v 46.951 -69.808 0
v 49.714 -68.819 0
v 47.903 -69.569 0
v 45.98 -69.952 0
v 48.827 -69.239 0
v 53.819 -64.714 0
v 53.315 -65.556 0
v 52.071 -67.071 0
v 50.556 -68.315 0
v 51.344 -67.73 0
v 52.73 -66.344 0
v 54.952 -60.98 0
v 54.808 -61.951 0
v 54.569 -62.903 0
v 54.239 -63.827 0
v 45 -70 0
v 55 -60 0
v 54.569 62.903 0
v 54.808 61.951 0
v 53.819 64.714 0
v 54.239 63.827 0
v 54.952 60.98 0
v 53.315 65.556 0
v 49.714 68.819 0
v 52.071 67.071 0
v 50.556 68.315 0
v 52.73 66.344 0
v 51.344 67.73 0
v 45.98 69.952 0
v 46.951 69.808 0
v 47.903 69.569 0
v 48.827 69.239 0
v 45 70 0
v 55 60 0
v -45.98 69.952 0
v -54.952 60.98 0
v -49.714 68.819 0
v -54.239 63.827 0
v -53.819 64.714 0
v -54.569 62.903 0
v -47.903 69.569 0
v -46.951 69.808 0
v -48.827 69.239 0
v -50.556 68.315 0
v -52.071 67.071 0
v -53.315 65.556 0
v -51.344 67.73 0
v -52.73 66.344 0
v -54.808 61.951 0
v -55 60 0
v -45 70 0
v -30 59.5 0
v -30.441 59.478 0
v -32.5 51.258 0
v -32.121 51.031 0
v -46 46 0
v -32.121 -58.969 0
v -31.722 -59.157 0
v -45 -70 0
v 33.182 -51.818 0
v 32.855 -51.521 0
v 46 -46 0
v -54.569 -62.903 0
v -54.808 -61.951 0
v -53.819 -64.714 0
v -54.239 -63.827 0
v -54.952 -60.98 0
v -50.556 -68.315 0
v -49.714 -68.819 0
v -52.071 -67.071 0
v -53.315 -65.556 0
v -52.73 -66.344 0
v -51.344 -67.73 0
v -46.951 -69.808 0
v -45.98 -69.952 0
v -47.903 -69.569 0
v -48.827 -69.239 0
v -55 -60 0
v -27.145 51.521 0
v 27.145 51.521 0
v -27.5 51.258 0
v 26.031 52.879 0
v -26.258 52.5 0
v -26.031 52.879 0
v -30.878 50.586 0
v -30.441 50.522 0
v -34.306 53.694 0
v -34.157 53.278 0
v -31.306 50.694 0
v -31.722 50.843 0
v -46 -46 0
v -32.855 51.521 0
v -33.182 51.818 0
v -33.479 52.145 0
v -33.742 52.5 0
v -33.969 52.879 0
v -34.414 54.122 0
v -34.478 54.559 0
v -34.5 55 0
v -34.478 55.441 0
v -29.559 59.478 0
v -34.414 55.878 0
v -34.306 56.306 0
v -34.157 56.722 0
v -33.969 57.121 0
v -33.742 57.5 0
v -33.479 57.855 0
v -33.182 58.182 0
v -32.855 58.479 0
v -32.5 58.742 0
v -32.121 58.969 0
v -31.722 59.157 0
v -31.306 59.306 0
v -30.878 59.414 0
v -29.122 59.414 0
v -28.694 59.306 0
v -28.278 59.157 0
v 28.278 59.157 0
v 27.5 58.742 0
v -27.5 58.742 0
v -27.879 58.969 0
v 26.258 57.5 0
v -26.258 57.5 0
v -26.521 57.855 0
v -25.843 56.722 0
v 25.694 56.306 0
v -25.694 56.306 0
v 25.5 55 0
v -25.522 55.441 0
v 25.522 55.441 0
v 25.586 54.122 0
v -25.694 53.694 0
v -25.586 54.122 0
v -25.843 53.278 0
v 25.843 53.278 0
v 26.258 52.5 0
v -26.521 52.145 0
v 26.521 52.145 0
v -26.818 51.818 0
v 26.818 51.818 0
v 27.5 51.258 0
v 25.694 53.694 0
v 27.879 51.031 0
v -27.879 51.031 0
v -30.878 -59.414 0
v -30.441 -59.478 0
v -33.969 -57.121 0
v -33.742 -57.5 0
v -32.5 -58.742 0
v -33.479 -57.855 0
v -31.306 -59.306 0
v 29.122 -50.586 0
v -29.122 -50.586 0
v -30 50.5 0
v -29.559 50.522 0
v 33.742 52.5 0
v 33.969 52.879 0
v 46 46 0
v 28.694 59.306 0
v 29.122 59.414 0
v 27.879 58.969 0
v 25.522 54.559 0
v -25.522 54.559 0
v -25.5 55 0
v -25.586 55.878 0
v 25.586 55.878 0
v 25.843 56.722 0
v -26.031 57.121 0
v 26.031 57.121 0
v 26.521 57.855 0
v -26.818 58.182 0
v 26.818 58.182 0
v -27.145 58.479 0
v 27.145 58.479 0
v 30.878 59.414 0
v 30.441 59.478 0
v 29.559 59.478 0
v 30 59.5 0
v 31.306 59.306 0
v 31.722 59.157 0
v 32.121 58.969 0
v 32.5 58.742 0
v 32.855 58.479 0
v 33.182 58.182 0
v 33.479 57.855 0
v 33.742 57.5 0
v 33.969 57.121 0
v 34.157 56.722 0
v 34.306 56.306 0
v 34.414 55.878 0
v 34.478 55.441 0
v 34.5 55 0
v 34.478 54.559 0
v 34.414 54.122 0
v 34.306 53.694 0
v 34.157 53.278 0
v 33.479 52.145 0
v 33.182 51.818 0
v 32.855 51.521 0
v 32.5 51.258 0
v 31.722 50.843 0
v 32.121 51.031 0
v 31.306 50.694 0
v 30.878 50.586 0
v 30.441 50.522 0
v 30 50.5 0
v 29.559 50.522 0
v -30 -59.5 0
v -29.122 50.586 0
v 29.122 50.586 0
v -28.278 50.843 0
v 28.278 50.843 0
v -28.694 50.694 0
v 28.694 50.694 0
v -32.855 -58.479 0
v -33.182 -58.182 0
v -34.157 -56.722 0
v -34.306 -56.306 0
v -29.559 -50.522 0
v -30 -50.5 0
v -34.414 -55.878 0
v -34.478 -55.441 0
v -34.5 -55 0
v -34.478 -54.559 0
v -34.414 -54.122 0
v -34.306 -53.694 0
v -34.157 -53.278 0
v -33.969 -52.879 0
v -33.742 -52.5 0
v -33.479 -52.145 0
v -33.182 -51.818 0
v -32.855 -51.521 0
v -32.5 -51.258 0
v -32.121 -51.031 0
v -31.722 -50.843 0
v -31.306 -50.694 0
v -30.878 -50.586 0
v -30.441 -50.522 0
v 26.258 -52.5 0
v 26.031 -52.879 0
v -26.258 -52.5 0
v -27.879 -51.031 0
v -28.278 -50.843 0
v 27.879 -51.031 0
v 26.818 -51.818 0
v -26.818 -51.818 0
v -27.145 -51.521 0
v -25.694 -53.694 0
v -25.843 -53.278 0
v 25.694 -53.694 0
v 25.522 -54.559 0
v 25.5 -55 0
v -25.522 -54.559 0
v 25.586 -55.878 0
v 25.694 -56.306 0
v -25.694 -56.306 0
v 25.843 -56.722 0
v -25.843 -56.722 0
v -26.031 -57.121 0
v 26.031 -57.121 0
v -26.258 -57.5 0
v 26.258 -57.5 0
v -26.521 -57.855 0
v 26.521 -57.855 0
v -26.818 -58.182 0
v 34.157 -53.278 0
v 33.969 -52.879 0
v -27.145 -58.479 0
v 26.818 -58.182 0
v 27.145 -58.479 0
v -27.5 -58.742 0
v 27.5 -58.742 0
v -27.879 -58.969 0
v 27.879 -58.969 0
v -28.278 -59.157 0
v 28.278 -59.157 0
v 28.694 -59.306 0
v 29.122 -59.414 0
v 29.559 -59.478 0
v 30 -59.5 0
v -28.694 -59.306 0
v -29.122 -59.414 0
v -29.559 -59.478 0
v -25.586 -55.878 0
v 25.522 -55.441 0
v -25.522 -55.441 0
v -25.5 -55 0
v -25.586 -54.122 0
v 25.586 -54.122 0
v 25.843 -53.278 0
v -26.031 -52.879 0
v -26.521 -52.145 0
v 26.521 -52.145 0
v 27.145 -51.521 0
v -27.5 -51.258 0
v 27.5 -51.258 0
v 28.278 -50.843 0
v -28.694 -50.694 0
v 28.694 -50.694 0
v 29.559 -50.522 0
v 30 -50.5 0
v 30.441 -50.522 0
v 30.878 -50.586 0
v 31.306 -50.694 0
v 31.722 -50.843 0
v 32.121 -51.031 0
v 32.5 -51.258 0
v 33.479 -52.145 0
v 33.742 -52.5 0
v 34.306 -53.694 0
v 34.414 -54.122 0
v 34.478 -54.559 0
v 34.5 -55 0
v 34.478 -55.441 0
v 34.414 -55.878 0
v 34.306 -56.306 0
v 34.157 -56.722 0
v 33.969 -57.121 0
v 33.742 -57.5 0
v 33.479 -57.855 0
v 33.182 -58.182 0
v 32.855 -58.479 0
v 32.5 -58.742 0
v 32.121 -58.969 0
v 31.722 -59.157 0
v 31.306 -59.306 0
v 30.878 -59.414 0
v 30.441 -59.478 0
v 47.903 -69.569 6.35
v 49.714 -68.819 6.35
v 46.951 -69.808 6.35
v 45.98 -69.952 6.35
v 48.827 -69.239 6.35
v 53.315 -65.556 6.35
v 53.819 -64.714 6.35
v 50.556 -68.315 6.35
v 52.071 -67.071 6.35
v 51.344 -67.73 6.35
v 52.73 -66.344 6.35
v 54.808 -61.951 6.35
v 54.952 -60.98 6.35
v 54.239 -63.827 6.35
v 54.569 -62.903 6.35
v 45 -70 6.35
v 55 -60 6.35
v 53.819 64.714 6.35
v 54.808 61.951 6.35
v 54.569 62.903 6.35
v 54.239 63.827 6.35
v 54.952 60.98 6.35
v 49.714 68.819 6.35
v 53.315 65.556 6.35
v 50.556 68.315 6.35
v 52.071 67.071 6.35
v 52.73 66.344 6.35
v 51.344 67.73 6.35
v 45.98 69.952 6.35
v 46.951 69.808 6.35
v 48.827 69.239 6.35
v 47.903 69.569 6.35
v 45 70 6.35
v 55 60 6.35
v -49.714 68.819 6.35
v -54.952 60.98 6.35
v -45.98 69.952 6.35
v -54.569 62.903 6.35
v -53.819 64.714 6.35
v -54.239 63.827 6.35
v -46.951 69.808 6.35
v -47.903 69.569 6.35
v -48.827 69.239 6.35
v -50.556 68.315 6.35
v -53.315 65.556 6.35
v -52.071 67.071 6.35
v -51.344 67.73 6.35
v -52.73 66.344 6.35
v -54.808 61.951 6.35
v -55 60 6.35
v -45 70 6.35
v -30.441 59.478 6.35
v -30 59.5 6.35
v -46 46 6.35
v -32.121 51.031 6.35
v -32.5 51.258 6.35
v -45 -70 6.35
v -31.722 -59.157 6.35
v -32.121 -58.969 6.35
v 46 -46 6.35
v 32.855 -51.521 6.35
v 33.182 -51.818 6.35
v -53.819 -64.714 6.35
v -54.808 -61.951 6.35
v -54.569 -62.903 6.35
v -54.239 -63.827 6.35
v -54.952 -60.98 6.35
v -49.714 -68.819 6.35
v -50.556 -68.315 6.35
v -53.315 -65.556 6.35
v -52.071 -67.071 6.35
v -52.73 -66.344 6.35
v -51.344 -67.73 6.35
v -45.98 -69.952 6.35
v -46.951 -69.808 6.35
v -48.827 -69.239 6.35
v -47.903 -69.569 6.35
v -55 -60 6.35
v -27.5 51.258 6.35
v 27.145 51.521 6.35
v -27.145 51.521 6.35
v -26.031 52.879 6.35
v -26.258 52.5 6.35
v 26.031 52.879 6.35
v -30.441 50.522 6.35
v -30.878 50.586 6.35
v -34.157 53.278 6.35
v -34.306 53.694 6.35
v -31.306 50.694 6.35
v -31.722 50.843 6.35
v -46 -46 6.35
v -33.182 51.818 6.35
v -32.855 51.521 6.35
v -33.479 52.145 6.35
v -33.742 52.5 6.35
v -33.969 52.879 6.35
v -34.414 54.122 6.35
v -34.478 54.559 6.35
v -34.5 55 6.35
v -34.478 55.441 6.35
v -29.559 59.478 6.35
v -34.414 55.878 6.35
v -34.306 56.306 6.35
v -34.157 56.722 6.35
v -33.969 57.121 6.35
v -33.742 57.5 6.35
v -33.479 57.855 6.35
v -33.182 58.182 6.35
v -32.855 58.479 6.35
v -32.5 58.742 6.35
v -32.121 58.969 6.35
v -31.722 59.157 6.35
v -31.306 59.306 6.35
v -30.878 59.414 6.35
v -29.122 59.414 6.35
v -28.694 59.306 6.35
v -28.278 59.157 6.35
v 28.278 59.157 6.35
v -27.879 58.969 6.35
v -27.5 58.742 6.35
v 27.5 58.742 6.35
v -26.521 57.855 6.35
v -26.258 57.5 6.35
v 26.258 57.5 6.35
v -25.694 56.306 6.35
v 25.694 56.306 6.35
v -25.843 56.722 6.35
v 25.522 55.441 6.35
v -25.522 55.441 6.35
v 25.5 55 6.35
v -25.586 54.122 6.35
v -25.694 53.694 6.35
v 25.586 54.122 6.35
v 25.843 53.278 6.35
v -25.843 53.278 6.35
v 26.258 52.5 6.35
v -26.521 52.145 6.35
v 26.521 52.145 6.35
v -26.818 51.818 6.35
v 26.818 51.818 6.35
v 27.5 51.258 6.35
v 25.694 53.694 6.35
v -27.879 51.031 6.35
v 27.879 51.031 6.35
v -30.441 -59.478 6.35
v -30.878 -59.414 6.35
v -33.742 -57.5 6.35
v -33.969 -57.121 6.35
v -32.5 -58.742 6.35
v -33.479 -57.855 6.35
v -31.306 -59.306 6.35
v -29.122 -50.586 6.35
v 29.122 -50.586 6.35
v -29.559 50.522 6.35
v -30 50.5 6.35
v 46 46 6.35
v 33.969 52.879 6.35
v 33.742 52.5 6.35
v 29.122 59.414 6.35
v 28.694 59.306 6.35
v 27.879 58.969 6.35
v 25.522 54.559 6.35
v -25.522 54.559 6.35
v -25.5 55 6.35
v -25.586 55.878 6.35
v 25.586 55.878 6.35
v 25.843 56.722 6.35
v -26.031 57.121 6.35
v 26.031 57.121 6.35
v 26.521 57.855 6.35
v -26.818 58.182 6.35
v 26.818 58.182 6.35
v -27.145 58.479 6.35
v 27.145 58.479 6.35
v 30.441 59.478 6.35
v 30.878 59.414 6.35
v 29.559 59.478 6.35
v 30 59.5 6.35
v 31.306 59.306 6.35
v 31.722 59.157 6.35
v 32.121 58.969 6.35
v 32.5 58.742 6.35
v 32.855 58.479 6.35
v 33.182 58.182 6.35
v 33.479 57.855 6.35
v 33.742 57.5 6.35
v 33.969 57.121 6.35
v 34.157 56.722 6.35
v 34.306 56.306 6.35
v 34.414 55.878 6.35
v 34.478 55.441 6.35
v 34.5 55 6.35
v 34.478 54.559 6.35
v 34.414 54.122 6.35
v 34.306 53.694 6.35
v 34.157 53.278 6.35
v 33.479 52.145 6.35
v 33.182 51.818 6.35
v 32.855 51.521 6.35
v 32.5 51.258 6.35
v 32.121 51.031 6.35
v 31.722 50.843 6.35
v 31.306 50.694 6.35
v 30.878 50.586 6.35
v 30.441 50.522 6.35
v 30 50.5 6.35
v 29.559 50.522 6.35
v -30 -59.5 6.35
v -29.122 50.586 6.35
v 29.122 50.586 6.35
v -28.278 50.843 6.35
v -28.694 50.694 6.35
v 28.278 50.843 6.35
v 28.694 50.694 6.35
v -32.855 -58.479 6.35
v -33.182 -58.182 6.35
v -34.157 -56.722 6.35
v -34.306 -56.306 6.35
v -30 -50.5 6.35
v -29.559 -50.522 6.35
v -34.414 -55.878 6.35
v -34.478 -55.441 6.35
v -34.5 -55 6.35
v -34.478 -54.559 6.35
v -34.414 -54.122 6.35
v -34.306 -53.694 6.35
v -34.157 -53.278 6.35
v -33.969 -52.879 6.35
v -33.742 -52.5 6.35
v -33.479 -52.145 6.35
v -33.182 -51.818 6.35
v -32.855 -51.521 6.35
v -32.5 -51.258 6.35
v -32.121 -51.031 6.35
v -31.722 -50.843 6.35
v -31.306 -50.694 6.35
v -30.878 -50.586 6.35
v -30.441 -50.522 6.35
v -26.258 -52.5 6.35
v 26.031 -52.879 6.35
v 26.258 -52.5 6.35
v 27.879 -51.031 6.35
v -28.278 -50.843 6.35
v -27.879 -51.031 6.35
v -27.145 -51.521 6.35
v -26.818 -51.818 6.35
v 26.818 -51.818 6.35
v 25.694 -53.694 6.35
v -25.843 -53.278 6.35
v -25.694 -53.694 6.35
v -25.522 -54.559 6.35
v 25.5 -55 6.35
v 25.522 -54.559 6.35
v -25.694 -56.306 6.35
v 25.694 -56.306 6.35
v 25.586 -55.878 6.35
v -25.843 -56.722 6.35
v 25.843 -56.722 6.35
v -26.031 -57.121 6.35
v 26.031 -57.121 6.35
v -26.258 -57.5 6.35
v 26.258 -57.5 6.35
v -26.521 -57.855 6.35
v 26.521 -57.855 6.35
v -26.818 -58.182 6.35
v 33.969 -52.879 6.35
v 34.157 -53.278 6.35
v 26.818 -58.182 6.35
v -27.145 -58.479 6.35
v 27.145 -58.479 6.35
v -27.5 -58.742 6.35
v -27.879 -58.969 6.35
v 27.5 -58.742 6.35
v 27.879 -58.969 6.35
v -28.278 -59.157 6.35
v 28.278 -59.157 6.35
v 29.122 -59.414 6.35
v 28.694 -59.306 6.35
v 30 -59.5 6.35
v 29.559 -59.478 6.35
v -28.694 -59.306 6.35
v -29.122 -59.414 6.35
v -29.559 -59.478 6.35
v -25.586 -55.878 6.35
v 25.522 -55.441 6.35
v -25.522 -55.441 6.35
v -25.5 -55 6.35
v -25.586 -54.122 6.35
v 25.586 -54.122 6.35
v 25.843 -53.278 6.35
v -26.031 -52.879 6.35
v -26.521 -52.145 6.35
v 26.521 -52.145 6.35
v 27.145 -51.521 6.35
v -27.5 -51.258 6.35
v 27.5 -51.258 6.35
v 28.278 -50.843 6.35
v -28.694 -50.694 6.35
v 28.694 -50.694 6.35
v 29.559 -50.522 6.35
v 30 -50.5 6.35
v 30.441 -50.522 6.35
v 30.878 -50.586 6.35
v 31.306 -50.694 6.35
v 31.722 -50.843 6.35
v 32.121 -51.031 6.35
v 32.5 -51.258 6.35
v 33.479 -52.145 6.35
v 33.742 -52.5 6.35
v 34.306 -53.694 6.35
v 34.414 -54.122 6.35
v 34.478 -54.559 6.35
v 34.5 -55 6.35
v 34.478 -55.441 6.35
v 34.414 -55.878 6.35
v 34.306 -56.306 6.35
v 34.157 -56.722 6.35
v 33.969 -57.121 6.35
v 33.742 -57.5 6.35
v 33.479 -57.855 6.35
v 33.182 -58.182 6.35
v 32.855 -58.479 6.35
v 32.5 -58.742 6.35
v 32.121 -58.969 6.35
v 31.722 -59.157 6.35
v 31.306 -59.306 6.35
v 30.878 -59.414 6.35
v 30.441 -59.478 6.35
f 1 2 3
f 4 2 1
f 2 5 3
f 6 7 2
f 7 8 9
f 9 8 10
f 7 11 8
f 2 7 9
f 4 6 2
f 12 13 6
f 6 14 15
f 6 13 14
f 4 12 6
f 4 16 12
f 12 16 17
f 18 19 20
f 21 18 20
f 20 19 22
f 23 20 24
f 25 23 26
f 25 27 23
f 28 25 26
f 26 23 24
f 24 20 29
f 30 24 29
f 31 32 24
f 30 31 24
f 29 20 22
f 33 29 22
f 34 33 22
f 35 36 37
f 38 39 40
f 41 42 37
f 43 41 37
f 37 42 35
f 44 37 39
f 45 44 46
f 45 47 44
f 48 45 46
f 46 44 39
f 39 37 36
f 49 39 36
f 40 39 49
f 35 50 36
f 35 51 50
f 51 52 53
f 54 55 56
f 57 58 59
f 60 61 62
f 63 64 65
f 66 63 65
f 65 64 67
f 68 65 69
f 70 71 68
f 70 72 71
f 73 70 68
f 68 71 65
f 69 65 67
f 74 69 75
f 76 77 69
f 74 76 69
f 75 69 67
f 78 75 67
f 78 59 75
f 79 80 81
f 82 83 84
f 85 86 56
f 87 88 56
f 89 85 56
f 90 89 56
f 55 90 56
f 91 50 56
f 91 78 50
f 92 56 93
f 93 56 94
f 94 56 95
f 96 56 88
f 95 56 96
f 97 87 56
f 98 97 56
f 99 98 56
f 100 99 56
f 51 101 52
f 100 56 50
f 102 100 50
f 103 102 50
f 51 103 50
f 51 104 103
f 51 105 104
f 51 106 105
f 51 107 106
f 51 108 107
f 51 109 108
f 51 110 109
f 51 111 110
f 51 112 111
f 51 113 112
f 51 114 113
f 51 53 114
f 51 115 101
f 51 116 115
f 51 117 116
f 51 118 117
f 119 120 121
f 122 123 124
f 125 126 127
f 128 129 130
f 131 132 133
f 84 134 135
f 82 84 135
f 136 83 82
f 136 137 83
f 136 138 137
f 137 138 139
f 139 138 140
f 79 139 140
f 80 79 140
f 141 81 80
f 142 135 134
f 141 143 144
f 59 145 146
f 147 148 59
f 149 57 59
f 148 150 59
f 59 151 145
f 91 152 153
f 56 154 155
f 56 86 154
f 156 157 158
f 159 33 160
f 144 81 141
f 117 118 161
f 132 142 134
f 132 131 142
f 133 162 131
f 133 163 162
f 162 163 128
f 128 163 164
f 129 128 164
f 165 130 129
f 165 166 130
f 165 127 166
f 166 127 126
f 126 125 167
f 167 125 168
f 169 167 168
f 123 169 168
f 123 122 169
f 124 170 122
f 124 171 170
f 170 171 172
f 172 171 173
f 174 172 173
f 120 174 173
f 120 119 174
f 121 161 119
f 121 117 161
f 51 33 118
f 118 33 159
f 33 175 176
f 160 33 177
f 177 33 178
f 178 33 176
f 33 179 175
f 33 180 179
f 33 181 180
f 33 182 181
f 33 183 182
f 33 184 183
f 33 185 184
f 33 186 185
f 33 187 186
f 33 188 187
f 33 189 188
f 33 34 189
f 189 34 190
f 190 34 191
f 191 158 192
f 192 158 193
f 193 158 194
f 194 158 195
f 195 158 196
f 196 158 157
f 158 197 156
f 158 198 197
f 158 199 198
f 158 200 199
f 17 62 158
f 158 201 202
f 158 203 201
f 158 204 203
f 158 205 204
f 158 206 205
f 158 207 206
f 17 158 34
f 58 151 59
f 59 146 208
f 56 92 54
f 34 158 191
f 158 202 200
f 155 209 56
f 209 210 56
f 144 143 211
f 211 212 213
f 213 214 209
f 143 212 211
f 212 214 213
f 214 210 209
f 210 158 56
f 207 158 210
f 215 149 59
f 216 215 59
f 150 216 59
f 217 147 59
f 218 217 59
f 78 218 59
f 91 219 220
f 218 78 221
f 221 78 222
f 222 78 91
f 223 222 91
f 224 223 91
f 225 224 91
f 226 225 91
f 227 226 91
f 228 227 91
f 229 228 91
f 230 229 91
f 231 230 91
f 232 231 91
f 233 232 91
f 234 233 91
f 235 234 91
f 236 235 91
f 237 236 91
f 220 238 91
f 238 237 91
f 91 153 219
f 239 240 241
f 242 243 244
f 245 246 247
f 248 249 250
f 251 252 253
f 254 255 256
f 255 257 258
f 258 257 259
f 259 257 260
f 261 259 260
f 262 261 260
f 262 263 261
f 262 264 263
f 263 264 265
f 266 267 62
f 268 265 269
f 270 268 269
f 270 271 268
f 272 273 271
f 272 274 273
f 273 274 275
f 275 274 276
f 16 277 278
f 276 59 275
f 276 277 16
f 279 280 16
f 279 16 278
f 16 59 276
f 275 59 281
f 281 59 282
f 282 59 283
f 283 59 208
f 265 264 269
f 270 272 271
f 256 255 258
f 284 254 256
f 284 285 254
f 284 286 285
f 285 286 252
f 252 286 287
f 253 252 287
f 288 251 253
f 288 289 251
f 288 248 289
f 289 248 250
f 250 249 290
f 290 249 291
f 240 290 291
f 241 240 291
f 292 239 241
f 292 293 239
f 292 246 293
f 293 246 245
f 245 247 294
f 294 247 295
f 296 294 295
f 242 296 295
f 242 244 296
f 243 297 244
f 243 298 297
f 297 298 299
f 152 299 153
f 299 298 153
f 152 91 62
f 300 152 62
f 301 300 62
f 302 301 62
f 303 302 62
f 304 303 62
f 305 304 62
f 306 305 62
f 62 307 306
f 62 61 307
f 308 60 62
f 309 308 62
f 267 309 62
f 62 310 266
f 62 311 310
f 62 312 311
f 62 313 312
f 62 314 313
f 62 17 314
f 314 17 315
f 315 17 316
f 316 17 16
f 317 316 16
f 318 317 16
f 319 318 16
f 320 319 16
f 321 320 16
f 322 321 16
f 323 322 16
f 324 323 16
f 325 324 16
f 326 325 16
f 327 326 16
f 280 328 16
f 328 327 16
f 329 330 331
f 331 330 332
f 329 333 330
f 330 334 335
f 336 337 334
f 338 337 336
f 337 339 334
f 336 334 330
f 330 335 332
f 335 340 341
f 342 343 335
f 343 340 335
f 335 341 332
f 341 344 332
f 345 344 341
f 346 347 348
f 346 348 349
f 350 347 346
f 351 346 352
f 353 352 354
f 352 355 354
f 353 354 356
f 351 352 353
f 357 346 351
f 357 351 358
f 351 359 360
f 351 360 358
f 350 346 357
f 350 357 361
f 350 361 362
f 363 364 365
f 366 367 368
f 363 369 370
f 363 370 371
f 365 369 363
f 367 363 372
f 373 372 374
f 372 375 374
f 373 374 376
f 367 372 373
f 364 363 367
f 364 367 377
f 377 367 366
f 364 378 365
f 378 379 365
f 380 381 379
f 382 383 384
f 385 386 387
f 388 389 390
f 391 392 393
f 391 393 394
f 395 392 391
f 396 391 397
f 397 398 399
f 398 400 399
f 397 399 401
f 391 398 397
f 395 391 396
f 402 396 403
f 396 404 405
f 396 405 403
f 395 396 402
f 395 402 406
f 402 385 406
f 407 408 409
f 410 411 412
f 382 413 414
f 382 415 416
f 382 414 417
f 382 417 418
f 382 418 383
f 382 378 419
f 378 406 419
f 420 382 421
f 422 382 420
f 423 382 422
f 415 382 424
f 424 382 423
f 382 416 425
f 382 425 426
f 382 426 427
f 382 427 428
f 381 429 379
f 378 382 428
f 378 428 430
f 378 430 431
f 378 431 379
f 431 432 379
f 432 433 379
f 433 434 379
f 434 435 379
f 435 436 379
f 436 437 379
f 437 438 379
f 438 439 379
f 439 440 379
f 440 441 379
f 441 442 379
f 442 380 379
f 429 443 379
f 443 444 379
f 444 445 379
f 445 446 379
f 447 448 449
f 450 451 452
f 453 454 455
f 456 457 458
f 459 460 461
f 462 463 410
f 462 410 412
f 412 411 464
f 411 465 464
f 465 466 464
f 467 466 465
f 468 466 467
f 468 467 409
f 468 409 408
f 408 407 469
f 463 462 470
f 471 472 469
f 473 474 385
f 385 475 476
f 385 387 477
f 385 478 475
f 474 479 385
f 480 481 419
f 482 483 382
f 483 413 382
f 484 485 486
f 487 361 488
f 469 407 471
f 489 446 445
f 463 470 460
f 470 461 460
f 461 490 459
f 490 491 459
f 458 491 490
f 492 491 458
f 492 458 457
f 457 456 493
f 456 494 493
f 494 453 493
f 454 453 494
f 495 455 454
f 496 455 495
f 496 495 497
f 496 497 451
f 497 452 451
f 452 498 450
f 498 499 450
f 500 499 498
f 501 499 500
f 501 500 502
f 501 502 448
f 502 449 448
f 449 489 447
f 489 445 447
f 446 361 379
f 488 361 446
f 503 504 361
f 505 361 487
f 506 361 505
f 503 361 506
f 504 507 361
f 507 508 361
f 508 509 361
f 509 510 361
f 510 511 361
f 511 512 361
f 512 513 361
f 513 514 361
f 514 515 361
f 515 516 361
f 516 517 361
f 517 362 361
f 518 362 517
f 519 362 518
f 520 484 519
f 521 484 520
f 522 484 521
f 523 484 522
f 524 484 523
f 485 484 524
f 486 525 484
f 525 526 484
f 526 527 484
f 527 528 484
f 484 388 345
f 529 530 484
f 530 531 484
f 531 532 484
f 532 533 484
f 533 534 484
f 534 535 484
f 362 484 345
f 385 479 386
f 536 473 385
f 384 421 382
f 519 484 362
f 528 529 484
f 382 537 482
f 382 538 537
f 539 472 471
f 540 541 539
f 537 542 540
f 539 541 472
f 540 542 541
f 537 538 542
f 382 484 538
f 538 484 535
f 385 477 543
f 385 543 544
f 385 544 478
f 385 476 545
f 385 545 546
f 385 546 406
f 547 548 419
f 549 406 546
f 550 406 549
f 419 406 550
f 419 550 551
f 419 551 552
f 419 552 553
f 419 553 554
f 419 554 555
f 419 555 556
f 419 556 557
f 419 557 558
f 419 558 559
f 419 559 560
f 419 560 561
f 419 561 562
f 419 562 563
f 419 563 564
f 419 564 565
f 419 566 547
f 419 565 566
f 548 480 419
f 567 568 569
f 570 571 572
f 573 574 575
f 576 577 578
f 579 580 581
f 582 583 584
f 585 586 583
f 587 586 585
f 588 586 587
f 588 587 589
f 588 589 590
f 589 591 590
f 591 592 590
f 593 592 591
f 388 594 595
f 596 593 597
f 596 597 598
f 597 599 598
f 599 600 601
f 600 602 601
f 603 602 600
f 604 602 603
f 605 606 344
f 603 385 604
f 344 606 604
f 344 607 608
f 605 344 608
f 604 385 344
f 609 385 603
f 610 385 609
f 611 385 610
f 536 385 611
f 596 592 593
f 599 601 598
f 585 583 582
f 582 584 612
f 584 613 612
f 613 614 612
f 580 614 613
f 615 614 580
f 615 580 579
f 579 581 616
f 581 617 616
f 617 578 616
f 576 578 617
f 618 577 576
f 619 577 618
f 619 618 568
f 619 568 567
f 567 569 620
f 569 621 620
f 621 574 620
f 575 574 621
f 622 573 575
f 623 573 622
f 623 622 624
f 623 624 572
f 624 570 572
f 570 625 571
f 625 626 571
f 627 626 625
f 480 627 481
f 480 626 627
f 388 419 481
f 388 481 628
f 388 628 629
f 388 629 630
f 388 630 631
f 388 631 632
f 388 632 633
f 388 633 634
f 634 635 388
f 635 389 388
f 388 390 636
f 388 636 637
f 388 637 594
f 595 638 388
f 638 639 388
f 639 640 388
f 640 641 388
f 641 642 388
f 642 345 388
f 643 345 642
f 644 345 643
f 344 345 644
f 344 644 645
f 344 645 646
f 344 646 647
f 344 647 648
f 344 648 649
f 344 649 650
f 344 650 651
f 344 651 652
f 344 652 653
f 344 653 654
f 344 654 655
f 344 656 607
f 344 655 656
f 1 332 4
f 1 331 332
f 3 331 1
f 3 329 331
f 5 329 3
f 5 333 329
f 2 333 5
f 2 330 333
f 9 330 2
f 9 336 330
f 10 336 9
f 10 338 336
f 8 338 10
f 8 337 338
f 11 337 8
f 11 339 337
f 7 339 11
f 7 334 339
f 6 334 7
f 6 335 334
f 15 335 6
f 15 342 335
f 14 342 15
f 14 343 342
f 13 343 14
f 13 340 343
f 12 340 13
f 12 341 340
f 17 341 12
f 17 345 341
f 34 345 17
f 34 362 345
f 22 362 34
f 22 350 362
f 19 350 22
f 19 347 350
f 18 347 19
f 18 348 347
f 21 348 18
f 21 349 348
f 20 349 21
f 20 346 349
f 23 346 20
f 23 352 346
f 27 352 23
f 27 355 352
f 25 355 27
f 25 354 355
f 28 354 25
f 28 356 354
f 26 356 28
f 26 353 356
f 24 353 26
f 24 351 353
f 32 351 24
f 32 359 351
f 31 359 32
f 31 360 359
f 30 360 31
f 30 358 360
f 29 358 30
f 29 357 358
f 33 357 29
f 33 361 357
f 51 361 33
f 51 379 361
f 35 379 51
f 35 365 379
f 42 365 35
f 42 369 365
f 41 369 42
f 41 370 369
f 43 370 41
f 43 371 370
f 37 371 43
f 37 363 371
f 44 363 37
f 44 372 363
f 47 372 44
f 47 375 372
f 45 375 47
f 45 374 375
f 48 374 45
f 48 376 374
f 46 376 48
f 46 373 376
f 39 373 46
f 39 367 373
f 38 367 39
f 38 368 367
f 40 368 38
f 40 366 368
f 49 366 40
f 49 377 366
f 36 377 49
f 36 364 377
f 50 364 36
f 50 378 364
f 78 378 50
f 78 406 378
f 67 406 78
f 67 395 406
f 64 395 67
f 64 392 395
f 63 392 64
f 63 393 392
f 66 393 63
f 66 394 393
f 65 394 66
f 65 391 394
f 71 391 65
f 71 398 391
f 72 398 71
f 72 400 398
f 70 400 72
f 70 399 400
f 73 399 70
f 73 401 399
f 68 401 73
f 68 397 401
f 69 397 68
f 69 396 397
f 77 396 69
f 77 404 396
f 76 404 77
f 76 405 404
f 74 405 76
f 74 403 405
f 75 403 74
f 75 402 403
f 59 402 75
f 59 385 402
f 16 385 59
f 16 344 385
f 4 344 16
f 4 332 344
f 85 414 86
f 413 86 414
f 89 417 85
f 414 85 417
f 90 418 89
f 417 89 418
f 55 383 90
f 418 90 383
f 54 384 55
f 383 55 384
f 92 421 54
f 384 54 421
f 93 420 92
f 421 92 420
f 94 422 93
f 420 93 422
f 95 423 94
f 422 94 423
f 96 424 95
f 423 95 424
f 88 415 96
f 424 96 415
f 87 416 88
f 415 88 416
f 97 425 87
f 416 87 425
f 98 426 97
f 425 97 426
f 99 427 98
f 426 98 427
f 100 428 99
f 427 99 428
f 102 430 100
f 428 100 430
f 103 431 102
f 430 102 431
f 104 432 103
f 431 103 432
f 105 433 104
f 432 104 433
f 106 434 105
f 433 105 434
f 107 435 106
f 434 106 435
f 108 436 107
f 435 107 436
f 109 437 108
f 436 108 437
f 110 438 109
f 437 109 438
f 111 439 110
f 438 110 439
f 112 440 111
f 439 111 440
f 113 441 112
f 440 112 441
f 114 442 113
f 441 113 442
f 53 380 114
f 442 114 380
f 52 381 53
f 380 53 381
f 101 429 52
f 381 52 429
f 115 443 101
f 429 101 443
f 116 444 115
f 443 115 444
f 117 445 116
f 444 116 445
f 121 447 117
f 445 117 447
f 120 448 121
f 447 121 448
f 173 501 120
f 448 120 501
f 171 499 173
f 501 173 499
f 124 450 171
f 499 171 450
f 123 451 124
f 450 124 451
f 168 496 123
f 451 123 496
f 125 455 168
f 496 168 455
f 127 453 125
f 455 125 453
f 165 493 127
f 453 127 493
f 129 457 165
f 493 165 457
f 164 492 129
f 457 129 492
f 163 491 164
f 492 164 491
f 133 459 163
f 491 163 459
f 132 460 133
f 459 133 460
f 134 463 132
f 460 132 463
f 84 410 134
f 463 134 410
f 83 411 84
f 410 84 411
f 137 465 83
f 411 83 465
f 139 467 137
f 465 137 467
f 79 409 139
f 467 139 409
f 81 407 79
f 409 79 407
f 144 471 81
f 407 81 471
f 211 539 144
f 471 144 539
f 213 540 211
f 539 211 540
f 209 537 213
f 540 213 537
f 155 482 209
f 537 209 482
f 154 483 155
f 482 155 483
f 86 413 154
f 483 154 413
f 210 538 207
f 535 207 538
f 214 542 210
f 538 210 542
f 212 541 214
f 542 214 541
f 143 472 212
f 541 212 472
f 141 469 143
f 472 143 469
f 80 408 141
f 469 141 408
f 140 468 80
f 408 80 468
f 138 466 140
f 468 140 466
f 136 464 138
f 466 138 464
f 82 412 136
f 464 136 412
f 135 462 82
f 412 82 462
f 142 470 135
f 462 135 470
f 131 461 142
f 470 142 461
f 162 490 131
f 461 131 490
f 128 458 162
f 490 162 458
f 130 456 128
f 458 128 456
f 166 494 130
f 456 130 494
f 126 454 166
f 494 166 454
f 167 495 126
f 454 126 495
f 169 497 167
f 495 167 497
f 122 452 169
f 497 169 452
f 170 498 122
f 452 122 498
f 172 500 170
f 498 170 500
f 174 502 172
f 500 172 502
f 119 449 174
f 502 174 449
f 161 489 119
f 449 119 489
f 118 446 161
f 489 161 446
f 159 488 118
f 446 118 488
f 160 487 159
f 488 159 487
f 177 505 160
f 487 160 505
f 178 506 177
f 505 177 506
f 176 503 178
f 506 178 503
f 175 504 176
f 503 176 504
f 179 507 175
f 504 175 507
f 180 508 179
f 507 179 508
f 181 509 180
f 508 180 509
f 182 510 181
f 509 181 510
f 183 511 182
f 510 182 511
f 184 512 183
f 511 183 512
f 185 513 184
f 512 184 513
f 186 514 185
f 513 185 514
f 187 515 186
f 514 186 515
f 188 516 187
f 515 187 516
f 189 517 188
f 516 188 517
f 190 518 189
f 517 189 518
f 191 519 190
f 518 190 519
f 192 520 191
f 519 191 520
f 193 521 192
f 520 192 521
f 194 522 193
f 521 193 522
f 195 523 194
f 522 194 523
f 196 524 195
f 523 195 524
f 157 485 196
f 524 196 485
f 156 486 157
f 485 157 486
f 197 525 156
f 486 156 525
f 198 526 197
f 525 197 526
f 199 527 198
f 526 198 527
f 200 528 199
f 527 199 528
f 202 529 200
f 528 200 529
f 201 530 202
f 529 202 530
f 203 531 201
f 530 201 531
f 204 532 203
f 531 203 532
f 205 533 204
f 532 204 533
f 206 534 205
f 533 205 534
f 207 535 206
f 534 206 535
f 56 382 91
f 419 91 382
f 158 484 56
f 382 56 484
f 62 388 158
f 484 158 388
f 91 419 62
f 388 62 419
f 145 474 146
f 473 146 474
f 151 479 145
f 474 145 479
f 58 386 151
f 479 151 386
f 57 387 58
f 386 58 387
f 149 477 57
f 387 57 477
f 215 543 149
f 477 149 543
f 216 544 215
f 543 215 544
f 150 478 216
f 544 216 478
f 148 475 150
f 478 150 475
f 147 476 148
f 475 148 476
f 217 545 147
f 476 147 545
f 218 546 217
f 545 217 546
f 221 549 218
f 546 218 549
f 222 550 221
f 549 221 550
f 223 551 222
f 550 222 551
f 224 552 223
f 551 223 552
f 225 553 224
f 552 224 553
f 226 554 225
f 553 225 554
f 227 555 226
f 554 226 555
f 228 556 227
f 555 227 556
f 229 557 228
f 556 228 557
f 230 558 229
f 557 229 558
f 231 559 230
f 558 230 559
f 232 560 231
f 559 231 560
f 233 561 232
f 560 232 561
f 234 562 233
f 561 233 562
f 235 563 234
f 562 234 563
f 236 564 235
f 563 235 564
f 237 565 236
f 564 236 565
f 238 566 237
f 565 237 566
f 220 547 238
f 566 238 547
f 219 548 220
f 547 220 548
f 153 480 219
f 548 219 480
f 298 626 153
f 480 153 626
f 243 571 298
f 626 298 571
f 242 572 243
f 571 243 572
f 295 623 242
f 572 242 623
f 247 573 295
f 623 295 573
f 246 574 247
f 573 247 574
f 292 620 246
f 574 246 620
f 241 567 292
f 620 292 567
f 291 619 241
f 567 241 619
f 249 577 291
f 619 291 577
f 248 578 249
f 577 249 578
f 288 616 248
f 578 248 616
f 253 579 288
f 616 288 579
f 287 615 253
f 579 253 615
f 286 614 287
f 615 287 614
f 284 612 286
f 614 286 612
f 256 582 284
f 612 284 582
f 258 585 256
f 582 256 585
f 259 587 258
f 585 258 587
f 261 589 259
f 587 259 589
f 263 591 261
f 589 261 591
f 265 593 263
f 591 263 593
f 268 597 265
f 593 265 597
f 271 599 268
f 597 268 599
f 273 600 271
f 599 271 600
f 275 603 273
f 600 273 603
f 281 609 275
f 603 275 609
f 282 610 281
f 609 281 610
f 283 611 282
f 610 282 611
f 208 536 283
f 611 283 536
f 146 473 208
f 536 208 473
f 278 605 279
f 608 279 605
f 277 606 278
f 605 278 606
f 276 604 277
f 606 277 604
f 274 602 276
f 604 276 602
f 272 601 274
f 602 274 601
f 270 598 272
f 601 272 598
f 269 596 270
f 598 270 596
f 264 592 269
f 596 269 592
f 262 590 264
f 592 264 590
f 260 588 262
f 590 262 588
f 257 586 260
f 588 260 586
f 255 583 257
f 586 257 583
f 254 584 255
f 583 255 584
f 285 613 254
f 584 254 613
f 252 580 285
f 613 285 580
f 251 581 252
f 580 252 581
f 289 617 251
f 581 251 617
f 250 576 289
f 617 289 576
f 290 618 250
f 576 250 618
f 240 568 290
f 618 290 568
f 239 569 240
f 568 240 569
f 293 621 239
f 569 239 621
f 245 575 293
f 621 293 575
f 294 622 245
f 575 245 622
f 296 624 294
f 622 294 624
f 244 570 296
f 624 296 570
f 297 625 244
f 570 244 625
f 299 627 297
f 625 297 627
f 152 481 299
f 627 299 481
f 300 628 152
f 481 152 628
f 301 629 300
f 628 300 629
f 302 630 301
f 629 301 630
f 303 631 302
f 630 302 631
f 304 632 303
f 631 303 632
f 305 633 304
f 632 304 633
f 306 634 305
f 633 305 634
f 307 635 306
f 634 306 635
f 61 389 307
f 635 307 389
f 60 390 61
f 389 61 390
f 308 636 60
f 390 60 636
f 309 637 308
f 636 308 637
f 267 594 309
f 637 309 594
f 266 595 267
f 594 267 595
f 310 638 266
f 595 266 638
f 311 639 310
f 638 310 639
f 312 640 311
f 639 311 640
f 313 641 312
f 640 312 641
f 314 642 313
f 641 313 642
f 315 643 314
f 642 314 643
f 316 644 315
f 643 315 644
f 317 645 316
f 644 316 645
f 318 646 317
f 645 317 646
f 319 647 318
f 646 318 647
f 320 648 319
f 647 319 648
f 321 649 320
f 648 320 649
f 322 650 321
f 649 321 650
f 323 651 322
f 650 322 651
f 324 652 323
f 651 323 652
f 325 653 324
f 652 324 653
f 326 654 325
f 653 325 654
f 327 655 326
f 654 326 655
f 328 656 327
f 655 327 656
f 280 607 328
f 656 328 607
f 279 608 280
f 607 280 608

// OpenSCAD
// Separate pan motor adapter surrounding the gearbox's 90-mm output flange.
// Units: mm; layout proxy; NOT FOR FABRICATION.
$fn=64;
length_x=110;
length_y=140;
thickness=6.35;
corner_radius=10;
flange_opening=92;
stand_off_x=[-30,30];
stand_off_y=[-55,55];
stand_off_hole_diameter=9;

linear_extrude(height=thickness)
  difference(){
    hull() for(x=[-length_x/2+corner_radius,length_x/2-corner_radius],
                y=[-length_y/2+corner_radius,length_y/2-corner_radius])
      translate([x,y]) circle(r=corner_radius);
    square([flange_opening,flange_opening],center=true);
    for(x=stand_off_x,y=stand_off_y)
      translate([x,y]) circle(d=stand_off_hole_diameter);
  }
